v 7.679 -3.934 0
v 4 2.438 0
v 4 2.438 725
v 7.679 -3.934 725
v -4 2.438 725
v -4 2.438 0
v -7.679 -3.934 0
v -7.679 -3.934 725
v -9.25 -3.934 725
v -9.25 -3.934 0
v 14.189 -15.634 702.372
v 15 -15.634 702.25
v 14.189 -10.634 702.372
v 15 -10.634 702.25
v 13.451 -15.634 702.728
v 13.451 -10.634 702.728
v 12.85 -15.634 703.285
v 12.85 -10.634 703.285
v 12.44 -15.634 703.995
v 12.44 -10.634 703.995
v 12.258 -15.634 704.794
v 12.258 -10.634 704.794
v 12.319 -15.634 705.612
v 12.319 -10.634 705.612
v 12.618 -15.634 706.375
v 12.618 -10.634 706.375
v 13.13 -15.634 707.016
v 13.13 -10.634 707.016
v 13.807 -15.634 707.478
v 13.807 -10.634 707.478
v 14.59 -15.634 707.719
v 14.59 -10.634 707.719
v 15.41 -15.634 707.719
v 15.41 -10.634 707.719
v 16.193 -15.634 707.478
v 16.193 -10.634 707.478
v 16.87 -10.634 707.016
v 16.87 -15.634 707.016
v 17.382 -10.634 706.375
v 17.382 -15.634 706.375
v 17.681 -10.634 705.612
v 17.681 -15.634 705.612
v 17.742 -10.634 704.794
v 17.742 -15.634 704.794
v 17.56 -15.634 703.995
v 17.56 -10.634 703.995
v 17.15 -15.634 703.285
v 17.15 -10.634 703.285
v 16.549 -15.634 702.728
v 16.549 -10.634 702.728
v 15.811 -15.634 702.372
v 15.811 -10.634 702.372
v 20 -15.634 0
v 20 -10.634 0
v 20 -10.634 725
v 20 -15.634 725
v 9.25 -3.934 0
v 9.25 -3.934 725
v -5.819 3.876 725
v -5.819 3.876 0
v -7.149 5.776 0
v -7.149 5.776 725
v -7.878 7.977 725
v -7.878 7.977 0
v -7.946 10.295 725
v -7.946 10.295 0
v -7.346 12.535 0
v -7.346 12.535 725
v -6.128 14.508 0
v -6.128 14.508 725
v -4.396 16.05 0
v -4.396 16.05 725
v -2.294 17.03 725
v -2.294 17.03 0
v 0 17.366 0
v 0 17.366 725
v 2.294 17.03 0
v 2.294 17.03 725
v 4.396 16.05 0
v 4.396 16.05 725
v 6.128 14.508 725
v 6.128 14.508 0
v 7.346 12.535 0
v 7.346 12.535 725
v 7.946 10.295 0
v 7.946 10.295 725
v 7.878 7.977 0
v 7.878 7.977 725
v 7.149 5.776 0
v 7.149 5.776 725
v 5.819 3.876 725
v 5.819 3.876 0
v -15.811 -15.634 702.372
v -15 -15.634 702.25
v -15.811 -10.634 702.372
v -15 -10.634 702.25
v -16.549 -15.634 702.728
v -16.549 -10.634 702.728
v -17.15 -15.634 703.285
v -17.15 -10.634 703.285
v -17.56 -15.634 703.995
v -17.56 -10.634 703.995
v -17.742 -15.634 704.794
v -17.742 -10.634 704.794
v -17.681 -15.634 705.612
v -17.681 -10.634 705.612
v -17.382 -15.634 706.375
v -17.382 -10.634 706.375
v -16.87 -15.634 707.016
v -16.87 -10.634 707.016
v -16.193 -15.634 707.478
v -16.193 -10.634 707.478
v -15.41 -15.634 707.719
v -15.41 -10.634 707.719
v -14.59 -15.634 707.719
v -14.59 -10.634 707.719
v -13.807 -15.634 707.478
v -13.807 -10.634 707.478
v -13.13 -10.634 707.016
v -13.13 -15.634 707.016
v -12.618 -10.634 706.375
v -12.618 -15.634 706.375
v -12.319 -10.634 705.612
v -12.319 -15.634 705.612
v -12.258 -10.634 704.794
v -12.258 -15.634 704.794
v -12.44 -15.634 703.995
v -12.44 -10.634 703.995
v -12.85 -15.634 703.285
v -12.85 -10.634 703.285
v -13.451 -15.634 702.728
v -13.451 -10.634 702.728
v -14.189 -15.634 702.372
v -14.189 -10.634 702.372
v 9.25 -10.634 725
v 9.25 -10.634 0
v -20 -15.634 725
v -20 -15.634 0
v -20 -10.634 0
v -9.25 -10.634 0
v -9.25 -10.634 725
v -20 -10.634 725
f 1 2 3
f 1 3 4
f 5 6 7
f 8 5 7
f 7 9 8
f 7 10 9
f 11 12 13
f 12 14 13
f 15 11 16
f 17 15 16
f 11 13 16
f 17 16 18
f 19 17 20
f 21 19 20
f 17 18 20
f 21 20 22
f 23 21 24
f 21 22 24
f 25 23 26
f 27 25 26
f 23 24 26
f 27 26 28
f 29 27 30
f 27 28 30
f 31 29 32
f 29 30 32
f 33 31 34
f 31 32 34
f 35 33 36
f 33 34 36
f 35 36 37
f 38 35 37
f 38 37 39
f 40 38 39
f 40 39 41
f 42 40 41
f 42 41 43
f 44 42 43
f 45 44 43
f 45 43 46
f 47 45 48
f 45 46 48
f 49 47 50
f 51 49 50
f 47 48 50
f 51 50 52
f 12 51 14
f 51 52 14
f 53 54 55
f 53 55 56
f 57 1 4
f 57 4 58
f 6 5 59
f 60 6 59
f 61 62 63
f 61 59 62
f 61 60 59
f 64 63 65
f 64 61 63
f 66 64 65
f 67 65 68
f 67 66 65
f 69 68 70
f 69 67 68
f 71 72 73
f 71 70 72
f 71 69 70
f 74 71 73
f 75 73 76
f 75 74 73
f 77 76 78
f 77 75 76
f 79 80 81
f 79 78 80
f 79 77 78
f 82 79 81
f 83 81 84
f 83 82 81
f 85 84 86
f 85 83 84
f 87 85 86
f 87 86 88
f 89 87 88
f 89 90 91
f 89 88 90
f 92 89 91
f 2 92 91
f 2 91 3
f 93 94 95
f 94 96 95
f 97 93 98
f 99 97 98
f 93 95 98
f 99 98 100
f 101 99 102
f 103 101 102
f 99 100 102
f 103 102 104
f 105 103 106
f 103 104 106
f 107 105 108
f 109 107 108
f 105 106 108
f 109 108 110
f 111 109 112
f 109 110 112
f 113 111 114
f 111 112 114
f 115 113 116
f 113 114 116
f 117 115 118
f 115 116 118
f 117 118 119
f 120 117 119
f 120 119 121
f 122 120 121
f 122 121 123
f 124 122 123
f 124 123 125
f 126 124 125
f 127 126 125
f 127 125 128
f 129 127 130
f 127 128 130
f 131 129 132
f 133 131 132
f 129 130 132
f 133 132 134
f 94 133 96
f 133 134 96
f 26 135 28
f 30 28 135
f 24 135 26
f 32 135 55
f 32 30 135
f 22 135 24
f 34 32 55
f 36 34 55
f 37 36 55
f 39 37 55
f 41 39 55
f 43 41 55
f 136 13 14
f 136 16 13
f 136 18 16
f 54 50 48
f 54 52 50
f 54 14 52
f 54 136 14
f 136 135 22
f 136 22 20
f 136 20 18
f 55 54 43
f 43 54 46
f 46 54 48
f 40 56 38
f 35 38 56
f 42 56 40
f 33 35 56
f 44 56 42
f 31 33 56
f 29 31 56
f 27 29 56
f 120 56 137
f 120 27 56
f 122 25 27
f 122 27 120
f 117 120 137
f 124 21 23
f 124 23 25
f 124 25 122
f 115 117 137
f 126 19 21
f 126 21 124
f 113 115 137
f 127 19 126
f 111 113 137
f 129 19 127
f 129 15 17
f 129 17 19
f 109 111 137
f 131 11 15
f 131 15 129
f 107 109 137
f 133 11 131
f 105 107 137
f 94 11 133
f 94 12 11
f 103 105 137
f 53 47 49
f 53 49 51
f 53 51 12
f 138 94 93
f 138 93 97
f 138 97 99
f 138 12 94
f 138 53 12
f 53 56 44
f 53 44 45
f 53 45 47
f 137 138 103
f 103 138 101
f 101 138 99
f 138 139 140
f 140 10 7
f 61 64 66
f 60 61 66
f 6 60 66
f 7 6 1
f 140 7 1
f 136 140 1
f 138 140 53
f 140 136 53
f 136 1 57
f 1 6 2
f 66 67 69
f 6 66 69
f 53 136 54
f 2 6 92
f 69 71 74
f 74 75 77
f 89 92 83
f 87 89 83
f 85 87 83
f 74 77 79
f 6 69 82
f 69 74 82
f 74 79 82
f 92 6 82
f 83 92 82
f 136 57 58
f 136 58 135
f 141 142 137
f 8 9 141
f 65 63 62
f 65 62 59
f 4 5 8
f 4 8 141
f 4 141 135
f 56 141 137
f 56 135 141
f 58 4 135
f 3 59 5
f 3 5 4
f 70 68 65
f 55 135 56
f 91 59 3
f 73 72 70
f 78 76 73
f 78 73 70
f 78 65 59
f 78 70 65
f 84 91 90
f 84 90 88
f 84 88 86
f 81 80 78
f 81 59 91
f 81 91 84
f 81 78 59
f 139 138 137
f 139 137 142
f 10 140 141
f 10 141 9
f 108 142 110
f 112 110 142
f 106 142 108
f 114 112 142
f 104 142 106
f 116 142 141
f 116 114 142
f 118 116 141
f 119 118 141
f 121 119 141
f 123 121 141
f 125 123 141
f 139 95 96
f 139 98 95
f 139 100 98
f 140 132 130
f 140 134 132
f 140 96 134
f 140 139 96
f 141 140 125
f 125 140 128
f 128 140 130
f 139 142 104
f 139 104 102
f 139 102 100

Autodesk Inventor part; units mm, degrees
ref_plane "YZ Plane" through (0, 0, 0) normal (1, 0, 0) x (0, 1, 0)
ref_plane "XZ Plane" through (0, 0, 0) normal (0, 1, 0) x (-1, 0, 0)
ref_plane "XY Plane" through (0, 0, 0) normal (0, 0, 1) x (1, 0, 0)
sketch "Esboço1" plane through (0, 0, 0) normal (0, 0, 1) x (1, 0, 0)
  arc A0 (4, 2.4377) -> (-4, 2.4377) centre (0, 9.3659) ccw
  line L0 (9.25, -3.9341) -> (9.25, -10.6341)
  line L1 (-9.25, -10.6341) -> (-9.25, -3.9341)
  line L2 (4, -15.6341) -> (-4, -15.6341)
  line L3 (20, -15.6341) -> (-20, -15.6341)
  line L4 (-20, -15.6341) -> (-20, -10.6341)
  line L5 (20, -10.6341) -> (20, -15.6341)
  line L6 (7.6788, -3.9341) -> (9.25, -3.9341)
  line L7 (-9.25, -3.9341) -> (-7.6788, -3.9341)
  line L8 (9.25, -10.6341) -> (20, -10.6341)
  line L9 (-20, -10.6341) -> (-9.25, -10.6341)
  line L10 (-4, 2.4377) -> (-7.6788, -3.9341)
  line L11 (-17.4151, -20.798) -> (-22.4188, -29.4646)
  line L12 (17.4151, -20.798) -> (23.6527, -31.6017)
  line L13 (9.25, -15.6341) -> (4, -15.6341)
  line L14 (0, -15.6341) -> (-9.25, -15.6341)
  line L15 (4, 2.4377) -> (7.6788, -3.9341)
  dimension "d6" = 16
  dimension "d7" = 25
  dimension "d8" = 18.5
  dimension "d9" = 11.7
  dimension "d10" = 8
  dimension "d13" = 5
  dimension "d14" = 40
extrude "Extrusão1" add sketch "Esboço1" along normal blind 725
sketch "Esboço3" plane through (-20, -15.6341, 0) normal (0, -1, 0) x (1, 0, 0)
  line L0 (0, 725) -> (40, 725) construction
  line L1 (20, 725) -> (20, 0) construction
  line L2 (20, 705) -> (5, 705) construction
  line L3 (5, 705) -> (20, 705) construction
  line L4 (20, 705) -> (35, 705) construction
  circle A0 centre (5, 705) radius 2.75
  circle A1 centre (35, 705) radius 2.75
  line L5 (40, 0) -> (0, 0) construction
  dimension "d18" = 15
  dimension "d19" = 15
  dimension "d20" = 5.5
  dimension "d21" = 5.5
  dimension "d22" = 20
hole "Furo1" at (-15, -15.6341, 705) at (15, -15.6341, 705) direction (0, 1, 0) diameter 5.5 depth 8 tip angle 118
properties part number "SBR16_EIXO_X_2"
